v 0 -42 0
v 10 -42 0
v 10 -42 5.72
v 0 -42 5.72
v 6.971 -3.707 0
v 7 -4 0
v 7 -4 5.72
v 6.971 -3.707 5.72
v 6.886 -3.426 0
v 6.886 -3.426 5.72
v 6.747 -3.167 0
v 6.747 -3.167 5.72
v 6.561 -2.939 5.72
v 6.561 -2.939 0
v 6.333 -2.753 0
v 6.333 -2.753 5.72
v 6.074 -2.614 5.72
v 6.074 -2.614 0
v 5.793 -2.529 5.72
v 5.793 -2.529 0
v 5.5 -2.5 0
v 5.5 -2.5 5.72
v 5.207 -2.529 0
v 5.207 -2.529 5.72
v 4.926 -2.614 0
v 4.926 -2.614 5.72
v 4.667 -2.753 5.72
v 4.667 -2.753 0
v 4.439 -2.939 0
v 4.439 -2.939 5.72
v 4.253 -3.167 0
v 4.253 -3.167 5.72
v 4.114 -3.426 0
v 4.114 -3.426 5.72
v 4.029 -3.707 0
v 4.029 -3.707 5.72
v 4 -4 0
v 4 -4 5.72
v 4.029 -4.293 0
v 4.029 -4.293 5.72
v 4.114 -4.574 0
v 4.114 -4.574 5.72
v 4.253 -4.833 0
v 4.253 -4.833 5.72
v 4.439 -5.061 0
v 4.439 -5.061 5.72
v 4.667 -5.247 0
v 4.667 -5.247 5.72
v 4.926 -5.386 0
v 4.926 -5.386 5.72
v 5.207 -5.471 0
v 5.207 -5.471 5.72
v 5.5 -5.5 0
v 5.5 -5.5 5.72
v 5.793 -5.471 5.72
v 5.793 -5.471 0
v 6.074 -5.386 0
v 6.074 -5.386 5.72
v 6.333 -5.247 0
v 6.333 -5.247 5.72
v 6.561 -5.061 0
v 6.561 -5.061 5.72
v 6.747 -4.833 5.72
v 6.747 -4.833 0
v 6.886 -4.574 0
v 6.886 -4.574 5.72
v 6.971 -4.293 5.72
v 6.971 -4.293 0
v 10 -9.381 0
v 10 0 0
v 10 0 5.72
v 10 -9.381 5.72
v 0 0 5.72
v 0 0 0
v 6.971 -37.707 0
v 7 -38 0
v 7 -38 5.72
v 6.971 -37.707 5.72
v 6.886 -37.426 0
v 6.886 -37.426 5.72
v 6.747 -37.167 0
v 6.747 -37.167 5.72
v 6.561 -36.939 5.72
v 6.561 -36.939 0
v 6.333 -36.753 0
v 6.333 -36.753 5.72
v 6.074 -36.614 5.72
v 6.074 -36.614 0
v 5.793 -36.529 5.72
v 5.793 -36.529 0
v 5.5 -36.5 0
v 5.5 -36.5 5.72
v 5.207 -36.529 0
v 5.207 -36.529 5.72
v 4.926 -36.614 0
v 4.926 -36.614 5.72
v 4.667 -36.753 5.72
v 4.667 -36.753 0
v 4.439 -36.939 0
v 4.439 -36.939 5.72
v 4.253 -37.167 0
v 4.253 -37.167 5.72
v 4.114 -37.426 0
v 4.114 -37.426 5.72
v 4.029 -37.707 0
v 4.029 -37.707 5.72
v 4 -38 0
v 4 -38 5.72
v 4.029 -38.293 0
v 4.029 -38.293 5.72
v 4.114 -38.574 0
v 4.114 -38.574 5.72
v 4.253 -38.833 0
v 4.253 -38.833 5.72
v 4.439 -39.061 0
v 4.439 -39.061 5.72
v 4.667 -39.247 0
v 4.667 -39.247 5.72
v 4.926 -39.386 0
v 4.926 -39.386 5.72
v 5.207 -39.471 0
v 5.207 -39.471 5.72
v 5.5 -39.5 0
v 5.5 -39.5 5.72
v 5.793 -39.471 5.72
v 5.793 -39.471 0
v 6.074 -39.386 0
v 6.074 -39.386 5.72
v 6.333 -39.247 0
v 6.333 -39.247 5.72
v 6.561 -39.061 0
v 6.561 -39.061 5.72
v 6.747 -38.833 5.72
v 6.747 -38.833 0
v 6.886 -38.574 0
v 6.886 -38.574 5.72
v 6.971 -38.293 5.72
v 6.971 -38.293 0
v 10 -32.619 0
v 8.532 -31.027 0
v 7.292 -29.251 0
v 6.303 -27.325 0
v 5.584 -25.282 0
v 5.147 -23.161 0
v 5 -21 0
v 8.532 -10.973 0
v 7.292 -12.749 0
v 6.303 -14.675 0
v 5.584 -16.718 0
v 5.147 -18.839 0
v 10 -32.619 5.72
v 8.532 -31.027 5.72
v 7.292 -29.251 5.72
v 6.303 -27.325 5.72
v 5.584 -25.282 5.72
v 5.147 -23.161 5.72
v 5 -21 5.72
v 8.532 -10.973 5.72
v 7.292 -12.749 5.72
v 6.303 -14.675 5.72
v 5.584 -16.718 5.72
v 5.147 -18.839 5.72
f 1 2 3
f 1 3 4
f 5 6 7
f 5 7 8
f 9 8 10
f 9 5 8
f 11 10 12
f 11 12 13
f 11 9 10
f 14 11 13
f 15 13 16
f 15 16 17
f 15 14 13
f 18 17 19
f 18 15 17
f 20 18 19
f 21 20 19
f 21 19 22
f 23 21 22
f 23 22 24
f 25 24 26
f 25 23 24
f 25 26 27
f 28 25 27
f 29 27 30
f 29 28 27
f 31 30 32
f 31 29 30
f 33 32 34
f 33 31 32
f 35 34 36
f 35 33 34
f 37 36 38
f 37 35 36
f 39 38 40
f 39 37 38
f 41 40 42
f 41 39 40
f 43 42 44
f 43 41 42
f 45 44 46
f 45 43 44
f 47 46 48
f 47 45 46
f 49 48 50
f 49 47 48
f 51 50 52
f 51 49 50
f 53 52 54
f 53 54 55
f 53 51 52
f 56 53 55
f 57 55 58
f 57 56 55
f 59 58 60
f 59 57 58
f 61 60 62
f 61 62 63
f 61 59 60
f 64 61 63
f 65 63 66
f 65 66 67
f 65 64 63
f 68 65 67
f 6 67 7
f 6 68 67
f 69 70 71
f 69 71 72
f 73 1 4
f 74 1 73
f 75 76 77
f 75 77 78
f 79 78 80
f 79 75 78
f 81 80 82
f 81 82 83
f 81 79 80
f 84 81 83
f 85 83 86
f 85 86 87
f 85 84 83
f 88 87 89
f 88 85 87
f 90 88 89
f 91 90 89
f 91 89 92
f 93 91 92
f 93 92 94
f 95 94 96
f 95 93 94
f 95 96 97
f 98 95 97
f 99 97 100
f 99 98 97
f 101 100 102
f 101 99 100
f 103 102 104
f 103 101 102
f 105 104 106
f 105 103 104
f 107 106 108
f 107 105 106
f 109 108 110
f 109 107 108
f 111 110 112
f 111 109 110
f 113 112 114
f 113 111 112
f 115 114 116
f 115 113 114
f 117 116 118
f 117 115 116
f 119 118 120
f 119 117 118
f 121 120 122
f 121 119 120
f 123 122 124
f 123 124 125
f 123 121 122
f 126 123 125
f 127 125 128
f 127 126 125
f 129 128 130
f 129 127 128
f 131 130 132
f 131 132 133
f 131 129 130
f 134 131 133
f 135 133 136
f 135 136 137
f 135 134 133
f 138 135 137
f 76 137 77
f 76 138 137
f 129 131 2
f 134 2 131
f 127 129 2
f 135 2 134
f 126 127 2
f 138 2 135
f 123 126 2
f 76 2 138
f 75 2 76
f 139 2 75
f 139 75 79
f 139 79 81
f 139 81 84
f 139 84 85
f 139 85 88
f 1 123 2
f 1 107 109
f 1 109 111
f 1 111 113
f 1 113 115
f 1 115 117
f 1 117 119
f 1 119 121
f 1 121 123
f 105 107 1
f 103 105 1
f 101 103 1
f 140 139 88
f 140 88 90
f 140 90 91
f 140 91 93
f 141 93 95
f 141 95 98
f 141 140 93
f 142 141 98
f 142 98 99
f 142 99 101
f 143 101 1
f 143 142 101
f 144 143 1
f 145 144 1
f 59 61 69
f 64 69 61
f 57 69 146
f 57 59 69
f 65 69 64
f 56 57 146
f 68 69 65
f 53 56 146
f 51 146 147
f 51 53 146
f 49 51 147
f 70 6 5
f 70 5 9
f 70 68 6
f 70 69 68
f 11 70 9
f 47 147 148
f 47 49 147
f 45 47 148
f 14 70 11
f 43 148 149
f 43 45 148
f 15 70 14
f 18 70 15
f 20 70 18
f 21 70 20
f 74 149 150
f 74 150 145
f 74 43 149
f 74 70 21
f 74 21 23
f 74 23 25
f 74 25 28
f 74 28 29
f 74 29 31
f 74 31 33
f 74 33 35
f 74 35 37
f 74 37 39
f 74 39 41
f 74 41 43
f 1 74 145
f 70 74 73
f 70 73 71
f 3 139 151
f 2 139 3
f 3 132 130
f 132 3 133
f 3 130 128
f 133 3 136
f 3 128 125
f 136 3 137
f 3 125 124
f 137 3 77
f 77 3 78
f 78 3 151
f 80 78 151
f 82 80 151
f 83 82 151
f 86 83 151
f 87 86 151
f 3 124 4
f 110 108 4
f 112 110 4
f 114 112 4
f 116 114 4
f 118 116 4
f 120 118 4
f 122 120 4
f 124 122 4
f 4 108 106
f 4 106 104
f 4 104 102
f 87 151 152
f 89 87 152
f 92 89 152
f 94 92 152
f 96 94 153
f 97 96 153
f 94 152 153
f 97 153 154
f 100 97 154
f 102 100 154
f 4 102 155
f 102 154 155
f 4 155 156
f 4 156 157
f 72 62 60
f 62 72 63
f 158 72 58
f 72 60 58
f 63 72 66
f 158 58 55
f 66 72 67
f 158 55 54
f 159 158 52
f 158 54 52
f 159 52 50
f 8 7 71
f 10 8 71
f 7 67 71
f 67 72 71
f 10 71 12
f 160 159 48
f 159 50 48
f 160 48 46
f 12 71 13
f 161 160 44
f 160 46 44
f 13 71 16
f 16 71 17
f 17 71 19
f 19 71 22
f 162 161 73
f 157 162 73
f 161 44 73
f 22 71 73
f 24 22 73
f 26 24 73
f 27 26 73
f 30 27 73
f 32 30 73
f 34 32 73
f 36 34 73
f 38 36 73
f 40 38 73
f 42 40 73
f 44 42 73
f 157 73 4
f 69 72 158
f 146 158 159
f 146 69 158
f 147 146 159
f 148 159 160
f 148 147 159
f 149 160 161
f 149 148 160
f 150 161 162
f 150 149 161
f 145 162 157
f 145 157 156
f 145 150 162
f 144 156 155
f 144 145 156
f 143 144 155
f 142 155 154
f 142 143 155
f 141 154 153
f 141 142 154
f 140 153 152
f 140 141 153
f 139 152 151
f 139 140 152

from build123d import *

# Parameters (mm, degrees)
SKETCH1_R           = 1.5
BOSS_EXTRUDE1_DEPTH = 5.72


with BuildPart() as part:
    # Sketch1 → Boss-Extrude1 (new body)
    with BuildSketch(Plane.XY):
        with BuildLine():
            Line((0, 0), (10, 0))
            Line((10, 0), (10, -9.381049961))
            ThreePointArc((10, -9.381049961), (5, -21), (10, -32.618950039))
            Line((10, -32.618950039), (10, -42))
            Line((10, -42), (0, -42))
            Line((0, -42), (0, 0))
        make_face()
        with Locations((5.5, -38)):
            Circle(SKETCH1_R, mode=Mode.SUBTRACT)
        with Locations((5.5, -4)):
            Circle(SKETCH1_R, mode=Mode.SUBTRACT)
    extrude(amount=BOSS_EXTRUDE1_DEPTH)


solid = part.part
